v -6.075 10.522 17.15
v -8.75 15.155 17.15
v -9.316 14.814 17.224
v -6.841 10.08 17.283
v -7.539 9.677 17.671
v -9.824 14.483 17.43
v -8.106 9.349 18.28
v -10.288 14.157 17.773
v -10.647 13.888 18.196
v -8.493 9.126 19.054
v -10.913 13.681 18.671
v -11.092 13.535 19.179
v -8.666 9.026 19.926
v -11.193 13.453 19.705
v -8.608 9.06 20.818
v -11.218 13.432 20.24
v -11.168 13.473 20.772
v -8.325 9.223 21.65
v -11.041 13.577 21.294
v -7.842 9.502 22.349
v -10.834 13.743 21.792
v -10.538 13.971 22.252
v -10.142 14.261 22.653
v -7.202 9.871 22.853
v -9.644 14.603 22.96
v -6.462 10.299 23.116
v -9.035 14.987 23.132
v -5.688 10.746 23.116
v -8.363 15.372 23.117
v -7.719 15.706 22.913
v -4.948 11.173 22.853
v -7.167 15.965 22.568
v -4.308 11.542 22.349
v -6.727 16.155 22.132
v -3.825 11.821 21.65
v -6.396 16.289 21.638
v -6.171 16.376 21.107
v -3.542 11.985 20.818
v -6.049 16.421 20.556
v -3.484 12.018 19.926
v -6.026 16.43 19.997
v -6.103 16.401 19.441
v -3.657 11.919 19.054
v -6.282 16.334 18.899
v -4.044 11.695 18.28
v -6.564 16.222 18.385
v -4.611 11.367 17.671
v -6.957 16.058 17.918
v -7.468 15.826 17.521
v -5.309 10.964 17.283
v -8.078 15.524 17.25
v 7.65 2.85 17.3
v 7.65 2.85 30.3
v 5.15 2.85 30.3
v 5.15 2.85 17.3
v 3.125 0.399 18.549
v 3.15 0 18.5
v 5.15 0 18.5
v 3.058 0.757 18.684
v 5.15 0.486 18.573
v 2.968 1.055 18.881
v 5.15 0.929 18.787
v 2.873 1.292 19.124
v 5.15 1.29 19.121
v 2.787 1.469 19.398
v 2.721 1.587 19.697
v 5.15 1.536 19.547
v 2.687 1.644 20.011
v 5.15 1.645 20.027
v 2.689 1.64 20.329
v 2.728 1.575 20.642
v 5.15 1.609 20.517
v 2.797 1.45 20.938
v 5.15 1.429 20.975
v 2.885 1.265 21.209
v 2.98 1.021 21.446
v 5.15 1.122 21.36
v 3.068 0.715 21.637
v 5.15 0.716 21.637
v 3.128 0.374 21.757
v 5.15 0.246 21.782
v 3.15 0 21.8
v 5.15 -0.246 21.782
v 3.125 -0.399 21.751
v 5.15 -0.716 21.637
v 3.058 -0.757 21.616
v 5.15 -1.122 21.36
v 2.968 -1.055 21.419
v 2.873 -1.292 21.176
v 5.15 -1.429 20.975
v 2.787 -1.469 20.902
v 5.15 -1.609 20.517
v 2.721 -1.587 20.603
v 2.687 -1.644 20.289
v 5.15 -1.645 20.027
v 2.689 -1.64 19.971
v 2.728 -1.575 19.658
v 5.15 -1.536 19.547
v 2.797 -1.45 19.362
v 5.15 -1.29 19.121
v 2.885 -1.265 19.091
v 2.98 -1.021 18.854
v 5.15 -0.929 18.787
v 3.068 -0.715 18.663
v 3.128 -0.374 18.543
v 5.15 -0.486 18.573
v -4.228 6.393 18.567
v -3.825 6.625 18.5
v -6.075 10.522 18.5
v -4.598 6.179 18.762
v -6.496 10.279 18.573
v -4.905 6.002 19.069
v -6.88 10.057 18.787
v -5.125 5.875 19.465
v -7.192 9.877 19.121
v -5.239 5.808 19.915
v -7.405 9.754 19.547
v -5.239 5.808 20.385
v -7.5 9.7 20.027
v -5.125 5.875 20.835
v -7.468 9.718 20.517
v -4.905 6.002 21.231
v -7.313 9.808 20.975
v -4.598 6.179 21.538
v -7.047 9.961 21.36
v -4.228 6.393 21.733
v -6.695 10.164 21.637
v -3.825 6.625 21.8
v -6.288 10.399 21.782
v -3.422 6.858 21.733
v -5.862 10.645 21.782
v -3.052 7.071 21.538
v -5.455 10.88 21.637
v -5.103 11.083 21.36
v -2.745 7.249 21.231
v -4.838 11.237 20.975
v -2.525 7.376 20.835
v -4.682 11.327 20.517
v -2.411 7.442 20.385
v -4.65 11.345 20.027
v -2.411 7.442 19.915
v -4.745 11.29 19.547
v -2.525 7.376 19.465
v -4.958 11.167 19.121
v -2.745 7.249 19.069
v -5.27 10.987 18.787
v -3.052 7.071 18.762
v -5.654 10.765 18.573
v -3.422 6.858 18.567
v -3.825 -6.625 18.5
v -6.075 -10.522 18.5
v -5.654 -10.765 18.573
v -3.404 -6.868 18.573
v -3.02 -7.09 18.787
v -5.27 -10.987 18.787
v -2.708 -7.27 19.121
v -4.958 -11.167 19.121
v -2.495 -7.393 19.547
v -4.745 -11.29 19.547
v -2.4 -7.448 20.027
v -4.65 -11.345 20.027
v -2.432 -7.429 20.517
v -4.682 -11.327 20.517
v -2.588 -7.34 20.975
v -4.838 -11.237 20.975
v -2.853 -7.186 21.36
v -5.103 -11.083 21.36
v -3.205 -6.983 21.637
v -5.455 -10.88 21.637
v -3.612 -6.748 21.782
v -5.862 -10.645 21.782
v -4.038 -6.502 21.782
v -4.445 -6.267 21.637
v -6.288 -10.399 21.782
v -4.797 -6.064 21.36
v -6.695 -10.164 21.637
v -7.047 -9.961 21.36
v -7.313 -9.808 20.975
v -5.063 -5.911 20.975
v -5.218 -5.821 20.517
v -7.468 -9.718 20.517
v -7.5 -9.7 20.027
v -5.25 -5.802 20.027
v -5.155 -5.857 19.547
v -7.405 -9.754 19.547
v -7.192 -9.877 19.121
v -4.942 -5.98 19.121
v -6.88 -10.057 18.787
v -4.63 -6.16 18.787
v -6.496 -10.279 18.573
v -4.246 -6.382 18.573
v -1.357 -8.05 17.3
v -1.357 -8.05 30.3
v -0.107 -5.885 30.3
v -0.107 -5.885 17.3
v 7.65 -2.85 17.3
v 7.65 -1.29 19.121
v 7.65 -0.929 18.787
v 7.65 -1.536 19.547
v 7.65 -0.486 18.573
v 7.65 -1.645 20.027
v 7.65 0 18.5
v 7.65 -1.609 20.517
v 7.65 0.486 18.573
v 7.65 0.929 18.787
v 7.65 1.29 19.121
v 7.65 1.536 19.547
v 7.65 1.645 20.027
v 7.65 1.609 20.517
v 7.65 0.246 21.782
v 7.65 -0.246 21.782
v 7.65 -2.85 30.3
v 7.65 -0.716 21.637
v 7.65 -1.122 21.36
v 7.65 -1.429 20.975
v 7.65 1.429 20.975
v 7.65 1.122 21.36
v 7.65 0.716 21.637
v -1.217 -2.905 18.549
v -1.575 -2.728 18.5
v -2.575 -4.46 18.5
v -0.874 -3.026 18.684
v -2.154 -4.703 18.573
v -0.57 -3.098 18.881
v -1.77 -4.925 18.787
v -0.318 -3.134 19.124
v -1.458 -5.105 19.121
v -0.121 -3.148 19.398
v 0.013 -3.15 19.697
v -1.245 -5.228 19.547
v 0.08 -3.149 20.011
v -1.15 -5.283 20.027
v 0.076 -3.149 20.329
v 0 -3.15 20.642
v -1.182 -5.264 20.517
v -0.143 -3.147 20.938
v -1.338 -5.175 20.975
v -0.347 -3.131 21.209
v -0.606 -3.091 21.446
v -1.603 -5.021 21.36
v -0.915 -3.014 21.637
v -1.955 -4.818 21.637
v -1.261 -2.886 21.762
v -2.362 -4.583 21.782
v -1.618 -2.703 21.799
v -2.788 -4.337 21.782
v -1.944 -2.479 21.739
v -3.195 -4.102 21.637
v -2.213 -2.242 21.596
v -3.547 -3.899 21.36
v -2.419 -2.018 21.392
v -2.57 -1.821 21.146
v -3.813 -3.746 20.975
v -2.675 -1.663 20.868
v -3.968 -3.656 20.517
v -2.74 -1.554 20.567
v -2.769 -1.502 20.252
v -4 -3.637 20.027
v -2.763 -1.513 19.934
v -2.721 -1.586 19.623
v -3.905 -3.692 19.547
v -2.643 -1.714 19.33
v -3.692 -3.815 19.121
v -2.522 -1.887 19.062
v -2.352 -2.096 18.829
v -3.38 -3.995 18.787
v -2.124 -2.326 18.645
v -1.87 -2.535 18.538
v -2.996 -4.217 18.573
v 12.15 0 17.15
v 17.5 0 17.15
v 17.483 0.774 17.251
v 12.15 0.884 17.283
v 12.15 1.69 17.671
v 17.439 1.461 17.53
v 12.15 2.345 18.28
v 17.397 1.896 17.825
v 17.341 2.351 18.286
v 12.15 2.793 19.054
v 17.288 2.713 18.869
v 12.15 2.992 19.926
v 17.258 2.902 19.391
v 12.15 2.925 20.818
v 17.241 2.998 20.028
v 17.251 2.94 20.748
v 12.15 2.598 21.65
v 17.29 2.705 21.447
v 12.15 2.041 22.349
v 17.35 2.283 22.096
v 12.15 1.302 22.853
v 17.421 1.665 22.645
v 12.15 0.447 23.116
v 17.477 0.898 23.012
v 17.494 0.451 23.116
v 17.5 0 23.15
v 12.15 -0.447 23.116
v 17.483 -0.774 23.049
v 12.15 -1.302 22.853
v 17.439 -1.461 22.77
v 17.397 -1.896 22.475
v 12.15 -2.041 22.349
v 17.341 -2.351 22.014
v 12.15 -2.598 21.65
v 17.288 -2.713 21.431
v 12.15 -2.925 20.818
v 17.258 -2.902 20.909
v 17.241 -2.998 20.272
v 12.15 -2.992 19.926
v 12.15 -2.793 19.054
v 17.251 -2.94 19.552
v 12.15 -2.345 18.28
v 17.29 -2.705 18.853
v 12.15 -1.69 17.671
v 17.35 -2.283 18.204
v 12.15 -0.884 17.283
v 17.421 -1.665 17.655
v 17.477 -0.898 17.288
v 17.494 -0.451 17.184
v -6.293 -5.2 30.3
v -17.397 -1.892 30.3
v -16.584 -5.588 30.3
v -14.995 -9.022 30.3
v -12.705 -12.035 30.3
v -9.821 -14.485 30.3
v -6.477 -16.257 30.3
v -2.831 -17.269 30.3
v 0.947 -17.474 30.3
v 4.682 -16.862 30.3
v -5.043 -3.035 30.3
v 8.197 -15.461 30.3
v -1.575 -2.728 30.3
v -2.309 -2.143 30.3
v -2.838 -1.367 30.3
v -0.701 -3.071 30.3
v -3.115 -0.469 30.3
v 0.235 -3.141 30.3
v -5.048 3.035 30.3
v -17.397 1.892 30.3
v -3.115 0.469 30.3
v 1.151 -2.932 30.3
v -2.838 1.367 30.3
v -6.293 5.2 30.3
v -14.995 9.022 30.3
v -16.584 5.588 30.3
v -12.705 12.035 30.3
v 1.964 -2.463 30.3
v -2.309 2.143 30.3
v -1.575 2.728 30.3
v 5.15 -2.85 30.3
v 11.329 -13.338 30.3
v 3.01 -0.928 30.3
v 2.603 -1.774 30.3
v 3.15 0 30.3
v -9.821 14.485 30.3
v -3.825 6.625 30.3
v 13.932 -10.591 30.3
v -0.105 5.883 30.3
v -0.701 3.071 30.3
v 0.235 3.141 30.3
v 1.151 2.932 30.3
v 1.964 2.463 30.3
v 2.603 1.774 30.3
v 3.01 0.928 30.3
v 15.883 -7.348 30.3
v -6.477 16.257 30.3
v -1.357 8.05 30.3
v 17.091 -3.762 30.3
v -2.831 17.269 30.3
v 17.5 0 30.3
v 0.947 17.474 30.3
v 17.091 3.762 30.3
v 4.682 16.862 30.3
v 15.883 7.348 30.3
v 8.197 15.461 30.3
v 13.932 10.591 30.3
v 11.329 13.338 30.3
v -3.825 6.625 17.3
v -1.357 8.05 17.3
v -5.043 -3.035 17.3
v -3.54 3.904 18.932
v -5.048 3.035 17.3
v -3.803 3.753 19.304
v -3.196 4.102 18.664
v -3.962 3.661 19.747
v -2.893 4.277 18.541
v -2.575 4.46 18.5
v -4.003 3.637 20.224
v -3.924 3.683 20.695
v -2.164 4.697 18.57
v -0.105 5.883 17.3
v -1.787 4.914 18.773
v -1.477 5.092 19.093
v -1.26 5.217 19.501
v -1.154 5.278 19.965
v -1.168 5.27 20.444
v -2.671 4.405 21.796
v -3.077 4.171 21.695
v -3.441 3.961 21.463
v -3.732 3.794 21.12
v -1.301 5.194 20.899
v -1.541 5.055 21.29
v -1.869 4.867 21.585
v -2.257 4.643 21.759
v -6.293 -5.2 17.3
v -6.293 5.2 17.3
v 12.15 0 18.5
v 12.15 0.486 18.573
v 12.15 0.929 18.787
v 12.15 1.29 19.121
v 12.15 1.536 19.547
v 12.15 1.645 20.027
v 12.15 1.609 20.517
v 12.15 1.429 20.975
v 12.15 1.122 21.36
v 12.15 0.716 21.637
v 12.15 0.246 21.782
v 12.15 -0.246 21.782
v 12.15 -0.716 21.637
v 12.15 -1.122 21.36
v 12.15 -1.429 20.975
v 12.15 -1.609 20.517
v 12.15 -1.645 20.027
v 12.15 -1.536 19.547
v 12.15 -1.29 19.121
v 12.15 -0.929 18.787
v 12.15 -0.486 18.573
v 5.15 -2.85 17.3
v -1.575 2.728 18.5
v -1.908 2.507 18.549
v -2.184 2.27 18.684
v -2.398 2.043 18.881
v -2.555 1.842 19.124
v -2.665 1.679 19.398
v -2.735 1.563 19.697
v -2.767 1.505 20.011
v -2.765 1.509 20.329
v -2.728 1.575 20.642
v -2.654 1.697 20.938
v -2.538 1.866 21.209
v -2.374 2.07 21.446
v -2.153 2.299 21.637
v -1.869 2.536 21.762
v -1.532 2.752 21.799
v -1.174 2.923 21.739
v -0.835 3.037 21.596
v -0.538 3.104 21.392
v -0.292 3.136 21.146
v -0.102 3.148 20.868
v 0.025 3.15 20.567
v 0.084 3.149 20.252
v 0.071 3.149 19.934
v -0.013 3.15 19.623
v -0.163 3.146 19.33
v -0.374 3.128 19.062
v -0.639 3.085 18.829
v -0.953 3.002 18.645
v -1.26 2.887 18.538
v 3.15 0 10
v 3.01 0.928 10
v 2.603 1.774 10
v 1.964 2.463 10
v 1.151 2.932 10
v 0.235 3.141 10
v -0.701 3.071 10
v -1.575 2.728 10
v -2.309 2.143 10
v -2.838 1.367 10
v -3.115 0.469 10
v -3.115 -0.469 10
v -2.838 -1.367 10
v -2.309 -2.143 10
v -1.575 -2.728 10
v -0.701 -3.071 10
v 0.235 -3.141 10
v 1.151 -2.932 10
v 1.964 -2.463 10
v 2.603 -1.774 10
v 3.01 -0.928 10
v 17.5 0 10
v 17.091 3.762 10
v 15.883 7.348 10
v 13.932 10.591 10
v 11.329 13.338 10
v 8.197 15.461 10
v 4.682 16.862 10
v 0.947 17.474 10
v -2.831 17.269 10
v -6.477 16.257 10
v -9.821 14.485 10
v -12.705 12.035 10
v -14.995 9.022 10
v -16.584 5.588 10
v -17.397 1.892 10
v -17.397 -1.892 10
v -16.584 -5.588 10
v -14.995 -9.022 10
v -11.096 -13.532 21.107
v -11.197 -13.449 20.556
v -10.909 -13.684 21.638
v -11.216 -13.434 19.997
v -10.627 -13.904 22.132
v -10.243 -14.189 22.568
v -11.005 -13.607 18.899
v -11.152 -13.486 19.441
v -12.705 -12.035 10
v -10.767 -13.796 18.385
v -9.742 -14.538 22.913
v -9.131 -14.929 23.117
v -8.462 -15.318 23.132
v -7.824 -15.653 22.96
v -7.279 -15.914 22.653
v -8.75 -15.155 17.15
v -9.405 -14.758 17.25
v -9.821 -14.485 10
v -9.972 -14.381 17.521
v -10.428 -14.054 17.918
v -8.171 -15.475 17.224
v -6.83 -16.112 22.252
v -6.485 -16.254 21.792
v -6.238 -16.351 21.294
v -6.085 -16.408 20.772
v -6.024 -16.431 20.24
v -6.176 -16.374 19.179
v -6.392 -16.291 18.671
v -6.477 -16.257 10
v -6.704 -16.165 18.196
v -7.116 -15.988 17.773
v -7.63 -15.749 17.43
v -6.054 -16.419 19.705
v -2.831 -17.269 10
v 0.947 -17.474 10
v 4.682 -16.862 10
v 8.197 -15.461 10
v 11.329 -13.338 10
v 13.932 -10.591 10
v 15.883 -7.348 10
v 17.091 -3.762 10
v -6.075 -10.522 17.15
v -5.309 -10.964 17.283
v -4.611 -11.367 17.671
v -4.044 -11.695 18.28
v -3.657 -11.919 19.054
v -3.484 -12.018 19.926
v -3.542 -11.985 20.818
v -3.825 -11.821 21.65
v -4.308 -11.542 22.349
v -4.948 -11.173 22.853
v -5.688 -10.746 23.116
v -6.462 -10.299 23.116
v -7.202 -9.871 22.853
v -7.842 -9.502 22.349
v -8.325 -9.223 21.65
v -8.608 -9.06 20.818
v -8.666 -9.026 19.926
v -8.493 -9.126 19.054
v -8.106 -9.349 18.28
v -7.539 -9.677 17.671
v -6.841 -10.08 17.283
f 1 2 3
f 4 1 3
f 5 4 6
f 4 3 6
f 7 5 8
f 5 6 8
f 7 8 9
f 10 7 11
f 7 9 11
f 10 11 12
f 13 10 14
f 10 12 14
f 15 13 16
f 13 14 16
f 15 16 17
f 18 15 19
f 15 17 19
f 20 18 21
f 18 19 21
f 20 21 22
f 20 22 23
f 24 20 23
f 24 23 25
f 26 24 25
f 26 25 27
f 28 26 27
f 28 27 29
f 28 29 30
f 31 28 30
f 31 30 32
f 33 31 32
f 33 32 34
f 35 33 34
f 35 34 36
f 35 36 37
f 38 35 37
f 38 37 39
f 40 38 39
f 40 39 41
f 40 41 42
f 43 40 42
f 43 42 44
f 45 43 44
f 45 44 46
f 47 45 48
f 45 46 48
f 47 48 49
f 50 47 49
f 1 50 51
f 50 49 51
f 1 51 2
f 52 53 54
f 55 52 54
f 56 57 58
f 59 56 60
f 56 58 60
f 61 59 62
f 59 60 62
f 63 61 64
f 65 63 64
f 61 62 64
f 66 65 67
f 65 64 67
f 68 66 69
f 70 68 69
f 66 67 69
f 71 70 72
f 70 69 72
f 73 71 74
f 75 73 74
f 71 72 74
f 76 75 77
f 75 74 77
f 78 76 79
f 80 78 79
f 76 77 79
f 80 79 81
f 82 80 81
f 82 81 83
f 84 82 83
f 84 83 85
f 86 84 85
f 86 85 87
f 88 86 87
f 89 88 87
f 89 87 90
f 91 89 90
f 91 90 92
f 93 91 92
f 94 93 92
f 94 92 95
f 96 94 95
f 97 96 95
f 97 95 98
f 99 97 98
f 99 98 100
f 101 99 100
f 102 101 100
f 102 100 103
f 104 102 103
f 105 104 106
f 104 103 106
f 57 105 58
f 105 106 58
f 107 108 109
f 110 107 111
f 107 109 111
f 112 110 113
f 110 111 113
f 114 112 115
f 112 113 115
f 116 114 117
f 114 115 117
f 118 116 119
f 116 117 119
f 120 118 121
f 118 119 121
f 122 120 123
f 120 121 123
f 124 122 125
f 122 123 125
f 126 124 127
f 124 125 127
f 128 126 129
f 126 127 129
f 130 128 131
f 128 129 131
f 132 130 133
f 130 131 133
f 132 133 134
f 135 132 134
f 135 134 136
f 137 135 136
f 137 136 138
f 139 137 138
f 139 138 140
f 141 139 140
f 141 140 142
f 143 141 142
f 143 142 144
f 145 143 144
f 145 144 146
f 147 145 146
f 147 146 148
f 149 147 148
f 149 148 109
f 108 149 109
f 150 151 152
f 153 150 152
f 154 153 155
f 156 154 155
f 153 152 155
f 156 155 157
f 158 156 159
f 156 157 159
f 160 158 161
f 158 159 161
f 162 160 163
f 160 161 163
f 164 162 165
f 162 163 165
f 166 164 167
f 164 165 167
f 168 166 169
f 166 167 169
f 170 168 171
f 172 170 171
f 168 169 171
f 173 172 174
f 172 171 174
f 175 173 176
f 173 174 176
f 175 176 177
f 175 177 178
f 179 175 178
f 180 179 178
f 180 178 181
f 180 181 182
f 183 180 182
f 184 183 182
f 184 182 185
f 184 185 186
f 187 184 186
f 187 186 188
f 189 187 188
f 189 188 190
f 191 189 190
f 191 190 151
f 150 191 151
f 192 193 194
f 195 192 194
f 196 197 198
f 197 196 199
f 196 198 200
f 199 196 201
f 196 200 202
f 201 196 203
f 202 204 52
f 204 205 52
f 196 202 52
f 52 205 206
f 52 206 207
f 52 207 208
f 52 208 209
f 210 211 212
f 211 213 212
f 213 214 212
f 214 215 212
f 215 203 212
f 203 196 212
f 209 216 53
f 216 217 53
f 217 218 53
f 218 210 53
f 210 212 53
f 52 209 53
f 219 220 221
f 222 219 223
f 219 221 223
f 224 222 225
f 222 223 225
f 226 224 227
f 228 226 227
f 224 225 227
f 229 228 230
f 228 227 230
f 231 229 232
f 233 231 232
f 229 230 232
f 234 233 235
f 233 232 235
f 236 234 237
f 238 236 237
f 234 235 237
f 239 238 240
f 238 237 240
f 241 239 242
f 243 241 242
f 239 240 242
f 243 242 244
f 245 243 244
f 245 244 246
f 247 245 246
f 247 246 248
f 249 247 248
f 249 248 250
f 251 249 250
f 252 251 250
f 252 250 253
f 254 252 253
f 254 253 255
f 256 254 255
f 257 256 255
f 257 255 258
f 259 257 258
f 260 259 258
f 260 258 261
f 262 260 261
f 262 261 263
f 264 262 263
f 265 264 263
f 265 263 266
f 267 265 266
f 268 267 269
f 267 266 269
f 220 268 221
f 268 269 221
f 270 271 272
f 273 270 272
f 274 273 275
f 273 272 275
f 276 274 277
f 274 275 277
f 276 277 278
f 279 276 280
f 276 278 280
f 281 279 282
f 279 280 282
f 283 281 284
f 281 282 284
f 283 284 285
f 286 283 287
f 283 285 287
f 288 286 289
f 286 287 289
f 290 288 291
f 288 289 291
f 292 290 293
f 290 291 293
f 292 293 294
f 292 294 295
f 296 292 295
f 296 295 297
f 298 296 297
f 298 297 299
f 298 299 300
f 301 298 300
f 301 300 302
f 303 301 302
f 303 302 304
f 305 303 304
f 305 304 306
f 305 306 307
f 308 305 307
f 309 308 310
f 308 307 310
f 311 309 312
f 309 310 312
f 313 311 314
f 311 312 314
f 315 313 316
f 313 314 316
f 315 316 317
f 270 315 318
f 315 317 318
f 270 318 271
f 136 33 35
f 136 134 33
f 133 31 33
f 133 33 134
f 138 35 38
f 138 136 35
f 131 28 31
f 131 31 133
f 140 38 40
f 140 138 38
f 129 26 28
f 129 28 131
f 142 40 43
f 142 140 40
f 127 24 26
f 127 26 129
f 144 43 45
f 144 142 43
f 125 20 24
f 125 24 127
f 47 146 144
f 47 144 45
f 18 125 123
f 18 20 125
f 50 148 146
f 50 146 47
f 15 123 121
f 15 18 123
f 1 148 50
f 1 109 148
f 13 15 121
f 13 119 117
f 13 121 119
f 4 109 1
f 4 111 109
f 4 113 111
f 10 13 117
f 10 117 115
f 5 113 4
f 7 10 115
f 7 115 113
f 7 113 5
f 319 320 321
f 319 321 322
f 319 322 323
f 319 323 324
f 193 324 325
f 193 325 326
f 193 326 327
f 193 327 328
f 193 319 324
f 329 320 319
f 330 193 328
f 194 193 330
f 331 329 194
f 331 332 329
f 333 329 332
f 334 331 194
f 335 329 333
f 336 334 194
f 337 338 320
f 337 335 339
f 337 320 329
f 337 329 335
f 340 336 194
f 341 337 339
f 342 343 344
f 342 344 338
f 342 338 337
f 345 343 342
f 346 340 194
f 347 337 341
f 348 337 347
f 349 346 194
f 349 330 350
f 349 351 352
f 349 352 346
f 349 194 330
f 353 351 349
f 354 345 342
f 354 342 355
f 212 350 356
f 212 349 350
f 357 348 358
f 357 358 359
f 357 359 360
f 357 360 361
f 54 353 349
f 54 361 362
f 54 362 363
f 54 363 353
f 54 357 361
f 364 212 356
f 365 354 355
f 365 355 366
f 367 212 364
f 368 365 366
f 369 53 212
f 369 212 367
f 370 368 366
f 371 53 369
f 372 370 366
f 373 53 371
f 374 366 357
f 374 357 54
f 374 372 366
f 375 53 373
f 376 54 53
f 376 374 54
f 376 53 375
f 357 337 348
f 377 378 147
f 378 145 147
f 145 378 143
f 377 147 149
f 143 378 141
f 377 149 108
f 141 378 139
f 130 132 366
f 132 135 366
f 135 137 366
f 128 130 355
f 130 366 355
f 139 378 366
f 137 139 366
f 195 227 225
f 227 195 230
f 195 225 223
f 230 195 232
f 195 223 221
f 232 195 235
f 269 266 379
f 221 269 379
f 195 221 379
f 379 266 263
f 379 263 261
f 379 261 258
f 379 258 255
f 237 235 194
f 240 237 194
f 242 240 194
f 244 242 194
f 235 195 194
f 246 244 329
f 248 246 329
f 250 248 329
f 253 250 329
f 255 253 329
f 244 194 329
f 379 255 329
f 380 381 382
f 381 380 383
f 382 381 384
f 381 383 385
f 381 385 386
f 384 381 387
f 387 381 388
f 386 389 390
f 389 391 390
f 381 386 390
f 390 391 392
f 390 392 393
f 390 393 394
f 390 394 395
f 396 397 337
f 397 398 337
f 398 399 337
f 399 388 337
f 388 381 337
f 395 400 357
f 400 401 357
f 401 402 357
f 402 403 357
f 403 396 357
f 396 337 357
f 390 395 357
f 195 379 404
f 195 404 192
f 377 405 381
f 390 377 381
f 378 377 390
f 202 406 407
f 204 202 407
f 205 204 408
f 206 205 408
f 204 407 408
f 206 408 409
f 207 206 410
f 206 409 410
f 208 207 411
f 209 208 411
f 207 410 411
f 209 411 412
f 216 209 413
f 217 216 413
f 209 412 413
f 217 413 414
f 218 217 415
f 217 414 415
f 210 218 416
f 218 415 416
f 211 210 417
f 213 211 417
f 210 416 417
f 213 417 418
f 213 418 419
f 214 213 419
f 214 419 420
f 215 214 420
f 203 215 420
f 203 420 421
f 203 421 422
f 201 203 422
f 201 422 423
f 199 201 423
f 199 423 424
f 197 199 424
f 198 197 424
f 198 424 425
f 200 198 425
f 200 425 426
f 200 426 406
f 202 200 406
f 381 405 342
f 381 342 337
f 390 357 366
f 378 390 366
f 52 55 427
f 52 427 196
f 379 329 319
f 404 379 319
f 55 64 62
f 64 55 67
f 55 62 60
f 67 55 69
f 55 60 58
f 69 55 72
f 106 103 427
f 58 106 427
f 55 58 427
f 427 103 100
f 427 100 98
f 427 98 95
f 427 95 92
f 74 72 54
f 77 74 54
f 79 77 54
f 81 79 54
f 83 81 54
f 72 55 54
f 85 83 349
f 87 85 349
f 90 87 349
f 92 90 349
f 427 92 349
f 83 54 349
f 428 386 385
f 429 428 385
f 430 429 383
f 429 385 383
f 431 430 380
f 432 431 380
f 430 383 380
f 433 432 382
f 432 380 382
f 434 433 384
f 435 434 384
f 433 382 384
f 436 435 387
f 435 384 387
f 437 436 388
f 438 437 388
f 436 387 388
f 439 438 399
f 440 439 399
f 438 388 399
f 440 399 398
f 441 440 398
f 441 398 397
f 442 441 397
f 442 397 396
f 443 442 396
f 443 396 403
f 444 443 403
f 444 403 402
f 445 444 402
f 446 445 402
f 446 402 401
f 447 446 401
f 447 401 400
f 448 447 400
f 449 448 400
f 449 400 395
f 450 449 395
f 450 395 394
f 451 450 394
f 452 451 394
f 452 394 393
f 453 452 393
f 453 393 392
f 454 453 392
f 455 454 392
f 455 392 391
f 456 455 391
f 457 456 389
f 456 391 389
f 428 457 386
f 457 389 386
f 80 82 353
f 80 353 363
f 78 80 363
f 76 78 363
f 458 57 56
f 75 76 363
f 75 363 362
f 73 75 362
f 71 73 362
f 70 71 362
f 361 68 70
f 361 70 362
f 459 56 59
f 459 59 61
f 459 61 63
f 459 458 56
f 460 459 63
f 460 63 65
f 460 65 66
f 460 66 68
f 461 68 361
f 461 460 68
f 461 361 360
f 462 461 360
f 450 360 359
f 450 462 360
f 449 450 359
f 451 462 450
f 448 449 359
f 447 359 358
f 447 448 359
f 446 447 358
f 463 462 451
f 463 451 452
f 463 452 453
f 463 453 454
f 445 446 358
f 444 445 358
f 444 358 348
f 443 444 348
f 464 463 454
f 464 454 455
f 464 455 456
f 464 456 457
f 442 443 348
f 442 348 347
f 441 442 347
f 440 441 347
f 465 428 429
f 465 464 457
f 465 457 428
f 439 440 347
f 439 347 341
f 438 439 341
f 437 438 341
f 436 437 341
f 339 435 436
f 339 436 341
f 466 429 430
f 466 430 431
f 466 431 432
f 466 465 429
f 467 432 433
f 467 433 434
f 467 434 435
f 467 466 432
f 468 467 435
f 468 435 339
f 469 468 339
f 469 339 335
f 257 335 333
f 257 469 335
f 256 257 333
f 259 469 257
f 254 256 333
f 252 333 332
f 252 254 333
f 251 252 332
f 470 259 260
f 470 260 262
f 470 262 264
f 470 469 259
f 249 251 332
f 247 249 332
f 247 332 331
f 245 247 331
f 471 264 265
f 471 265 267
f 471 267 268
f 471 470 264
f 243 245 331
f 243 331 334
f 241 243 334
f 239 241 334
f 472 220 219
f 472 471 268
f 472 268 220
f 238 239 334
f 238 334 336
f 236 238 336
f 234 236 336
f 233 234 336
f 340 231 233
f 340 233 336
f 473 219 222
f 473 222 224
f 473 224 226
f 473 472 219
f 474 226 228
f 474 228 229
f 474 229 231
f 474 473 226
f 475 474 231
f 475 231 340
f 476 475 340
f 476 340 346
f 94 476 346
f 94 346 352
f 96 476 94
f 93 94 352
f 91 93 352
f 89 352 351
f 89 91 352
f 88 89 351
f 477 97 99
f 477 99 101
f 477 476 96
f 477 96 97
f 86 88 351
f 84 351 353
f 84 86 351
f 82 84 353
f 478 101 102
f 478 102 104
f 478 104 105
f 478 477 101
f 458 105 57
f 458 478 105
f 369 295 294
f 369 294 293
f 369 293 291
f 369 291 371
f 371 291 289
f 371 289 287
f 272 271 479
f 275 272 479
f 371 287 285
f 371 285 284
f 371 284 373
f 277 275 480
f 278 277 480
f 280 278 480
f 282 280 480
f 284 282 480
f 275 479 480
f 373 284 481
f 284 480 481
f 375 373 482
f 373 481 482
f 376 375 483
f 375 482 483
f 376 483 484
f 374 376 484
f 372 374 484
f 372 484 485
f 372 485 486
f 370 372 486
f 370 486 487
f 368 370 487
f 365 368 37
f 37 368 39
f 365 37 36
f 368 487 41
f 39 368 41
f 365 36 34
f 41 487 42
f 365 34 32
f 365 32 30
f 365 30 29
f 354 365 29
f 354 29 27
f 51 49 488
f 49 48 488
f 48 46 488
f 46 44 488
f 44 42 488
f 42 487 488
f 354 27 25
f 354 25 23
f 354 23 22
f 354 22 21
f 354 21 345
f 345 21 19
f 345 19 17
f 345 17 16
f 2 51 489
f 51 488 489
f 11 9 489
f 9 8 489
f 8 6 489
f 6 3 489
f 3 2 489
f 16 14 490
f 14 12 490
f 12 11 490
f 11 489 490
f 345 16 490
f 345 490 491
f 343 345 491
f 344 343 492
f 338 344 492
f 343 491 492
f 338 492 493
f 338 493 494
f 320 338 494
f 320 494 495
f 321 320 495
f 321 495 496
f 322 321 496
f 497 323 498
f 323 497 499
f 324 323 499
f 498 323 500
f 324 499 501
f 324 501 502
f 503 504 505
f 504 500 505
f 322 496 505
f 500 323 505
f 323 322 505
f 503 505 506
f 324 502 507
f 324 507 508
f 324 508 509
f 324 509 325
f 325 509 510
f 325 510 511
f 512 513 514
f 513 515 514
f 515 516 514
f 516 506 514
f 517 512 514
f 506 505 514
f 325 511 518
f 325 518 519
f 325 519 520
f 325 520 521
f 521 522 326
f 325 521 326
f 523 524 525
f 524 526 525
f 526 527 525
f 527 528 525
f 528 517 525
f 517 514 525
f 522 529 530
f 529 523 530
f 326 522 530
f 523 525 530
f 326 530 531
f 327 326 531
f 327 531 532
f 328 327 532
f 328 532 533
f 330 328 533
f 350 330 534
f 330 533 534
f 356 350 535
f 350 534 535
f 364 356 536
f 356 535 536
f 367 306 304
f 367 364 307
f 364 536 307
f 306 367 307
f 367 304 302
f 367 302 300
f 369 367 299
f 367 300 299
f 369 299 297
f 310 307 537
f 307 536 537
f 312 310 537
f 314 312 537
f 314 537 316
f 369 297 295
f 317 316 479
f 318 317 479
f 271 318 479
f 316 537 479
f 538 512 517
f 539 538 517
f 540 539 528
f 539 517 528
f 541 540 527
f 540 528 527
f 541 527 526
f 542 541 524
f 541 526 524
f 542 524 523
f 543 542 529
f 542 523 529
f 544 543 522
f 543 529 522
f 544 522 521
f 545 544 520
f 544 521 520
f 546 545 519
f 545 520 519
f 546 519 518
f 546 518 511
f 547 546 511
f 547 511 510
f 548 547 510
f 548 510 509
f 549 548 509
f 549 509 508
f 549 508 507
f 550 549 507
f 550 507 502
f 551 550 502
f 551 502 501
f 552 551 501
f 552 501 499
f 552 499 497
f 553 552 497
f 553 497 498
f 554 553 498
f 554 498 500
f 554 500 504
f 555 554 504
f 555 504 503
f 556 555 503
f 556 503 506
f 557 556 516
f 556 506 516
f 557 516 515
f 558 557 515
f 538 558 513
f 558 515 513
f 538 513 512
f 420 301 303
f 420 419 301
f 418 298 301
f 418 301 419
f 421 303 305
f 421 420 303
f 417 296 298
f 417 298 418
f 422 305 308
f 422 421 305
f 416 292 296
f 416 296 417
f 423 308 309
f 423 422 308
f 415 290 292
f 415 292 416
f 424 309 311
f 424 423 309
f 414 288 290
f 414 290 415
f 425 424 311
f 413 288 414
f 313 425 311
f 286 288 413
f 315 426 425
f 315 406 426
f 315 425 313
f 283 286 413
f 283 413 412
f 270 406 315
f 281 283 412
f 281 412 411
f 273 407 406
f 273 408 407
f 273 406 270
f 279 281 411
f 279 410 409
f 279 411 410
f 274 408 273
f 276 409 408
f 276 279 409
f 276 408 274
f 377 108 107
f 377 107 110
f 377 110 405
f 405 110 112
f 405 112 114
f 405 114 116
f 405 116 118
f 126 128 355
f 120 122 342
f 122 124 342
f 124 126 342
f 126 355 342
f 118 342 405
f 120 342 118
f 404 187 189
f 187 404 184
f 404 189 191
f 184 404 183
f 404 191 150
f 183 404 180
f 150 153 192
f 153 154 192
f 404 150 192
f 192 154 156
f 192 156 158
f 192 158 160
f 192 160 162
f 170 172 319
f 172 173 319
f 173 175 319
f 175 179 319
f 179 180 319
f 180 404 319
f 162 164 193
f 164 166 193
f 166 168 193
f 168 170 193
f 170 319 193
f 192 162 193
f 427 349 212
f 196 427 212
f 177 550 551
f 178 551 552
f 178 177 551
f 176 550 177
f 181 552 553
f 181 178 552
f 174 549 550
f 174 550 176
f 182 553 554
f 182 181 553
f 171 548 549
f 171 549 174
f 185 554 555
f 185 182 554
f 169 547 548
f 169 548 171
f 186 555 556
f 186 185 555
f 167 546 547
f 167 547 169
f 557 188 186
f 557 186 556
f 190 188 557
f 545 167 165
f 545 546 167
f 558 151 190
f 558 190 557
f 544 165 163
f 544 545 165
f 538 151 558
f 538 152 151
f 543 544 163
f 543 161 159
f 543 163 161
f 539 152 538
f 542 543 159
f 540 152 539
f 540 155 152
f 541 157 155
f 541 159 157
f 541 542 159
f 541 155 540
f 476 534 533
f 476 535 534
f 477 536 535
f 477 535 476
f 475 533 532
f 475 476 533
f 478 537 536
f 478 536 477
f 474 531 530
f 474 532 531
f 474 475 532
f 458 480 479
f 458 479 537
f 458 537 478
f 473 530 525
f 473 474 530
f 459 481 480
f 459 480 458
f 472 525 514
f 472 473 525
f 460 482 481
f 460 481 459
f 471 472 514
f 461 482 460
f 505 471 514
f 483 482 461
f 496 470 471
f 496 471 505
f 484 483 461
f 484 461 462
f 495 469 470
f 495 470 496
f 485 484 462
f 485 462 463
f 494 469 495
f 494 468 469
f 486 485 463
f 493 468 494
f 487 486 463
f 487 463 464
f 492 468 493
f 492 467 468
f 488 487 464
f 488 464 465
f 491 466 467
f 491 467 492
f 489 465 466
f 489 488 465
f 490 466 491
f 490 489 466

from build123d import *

# Parameters (mm, degrees)
SKETCH1_R           = 17.5
SKETCH1_R_2         = 3.15
BOSS_EXTRUDE1_DEPTH = 40.3
CUT_EXTRUDE1_DEPTH  = 23
CUT_EXTRUDE4_REACH  = 43.405
SKETCH8_R           = 1.65
CUT_EXTRUDE5_REACH  = 43.405
SKETCH10_R          = 1.65
SKETCH12_R          = 3
CUT_EXTRUDE6_DEPTH  = 5.35
SKETCH15_R          = 3
CUT_EXTRUDE8_DEPTH  = 5.35
CUT_EXTRUDE9_REACH  = 43.405
SKETCH17_R          = 1.65
CUT_EXTRUDE10_REACH = 43.405
SKETCH18_R          = 1.65
SKETCH19_R          = 3
CUT_EXTRUDE11_DEPTH = 5.35
CUT_EXTRUDE12_REACH = 37
SKETCH20_R          = 1.65
CUT_EXTRUDE13_REACH = 37
SKETCH21_R          = 1.65
SKETCH22_R          = 17.5
CUT_EXTRUDE14_DEPTH = 10
SKETCH23_R          = 17.5
CUT_EXTRUDE15_DEPTH = 10


with BuildPart() as part:
    # Sketch1 → Boss-Extrude1 (new body)
    with BuildSketch(Plane.XY):
        Circle(SKETCH1_R)
        Circle(SKETCH1_R_2, mode=Mode.SUBTRACT)
    extrude(amount=BOSS_EXTRUDE1_DEPTH)

    # Sketch2 → Cut-Extrude1 (cut)
    with BuildSketch(Plane.XY.offset(40.3)):
        Polygon((7.65, 0), (7.65, 2.85), (5.15, 2.85), (5.15, -2.85), (7.65, -2.85), align=None)
        Polygon((-3.825, -6.625094339), (-1.356827599, -8.050094339), (-0.106827599, -5.885030829), (-5.043172401, -3.035030829), (-6.293172401, -5.200094339), align=None)
        Polygon((-3.825, 6.625094339), (-6.293172401, 5.200094339), (-5.048242412, 3.035349353), (-0.105426694, 5.882604512), (-1.356827546, 8.050094369), align=None)
    extrude(amount=-CUT_EXTRUDE1_DEPTH, mode=Mode.SUBTRACT)

    # Sketch8 → Cut-Extrude4 (cut, up to next)
    with BuildSketch(Plane(origin=(-8.75, -15.155444566, 0), x_dir=(0, 0, -1), z_dir=(-0.5, -0.866025404, 0)), mode=Mode.PRIVATE) as cut_extrude4_sk1:
        with Locations((-20.15, 0)):
            Circle(SKETCH8_R)
    cut_extrude4_tool1 = extrude(cut_extrude4_sk1.sketch, amount=-CUT_EXTRUDE4_REACH, mode=Mode.PRIVATE) & part.part
    add(cut_extrude4_tool1.solids().sort_by_distance((-8.75, -15.155445, 20.15))[0], mode=Mode.SUBTRACT)

    # Sketch10 → Cut-Extrude5 (cut, up to next)
    with BuildSketch(Plane(origin=(-8.75, -15.155444566, 0), x_dir=(0, 0, -1), z_dir=(-0.5, -0.866025404, 0)), mode=Mode.PRIVATE) as cut_extrude5_sk1:
        with Locations((-20.15, 0)):
            Circle(SKETCH10_R)
    cut_extrude5_tool1 = extrude(cut_extrude5_sk1.sketch, amount=-CUT_EXTRUDE5_REACH, mode=Mode.PRIVATE) & part.part
    add(cut_extrude5_tool1.solids().sort_by_distance((-8.75, -15.155445, 20.15))[0], mode=Mode.SUBTRACT)

    # Sketch12 → Cut-Extrude6 (cut)
    with BuildSketch(Plane(origin=(-8.75, -15.155444566, 0), x_dir=(0, 0, -1), z_dir=(-0.5, -0.866025404, 0))):
        with Locations((-20.15, 0)):
            Circle(SKETCH12_R)
    extrude(amount=-CUT_EXTRUDE6_DEPTH, mode=Mode.SUBTRACT)

    # Sketch15 → Cut-Extrude8 (cut)
    with BuildSketch(Plane(origin=(-8.75, 15.155444566, 0), x_dir=(0, 0, -1), z_dir=(-0.5, 0.866025404, 0))):
        with Locations((-20.15, 0)):
            Circle(SKETCH15_R)
    extrude(amount=-CUT_EXTRUDE8_DEPTH, mode=Mode.SUBTRACT)

    # Sketch17 → Cut-Extrude9 (cut, up to next)
    with BuildSketch(Plane(origin=(-8.75, 15.155444566, 0), x_dir=(0, 0, -1), z_dir=(-0.5, 0.866025404, 0)), mode=Mode.PRIVATE) as cut_extrude9_sk1:
        with Locations((-20.15, 0)):
            Circle(SKETCH17_R)
    cut_extrude9_tool1 = extrude(cut_extrude9_sk1.sketch, amount=-CUT_EXTRUDE9_REACH, mode=Mode.PRIVATE) & part.part
    add(cut_extrude9_tool1.solids().sort_by_distance((-8.75, 15.155445, 20.15))[0], mode=Mode.SUBTRACT)

    # Sketch18 → Cut-Extrude10 (cut, up to next)
    with BuildSketch(Plane(origin=(-8.75, 15.155444566, 0), x_dir=(0, 0, -1), z_dir=(-0.5, 0.866025404, 0)), mode=Mode.PRIVATE) as cut_extrude10_sk1:
        with Locations((-20.15, 0)):
            Circle(SKETCH18_R)
    cut_extrude10_tool1 = extrude(cut_extrude10_sk1.sketch, amount=-CUT_EXTRUDE10_REACH, mode=Mode.PRIVATE) & part.part
    add(cut_extrude10_tool1.solids().sort_by_distance((-8.75, 15.155445, 20.15))[0], mode=Mode.SUBTRACT)

    # Sketch19 → Cut-Extrude11 (cut)
    with BuildSketch(Plane(origin=(17.5, 0, 0), x_dir=(0, 0, -1), z_dir=(1, 0, 0))):
        with Locations((-20.15, 0)):
            Circle(SKETCH19_R)
    extrude(amount=-CUT_EXTRUDE11_DEPTH, mode=Mode.SUBTRACT)

    # Sketch20 → Cut-Extrude12 (cut, up to next)
    with BuildSketch(Plane(origin=(17.5, 0, 0), x_dir=(0, 0, -1), z_dir=(1, 0, 0)), mode=Mode.PRIVATE) as cut_extrude12_sk1:
        with Locations((-20.15, 0)):
            Circle(SKETCH20_R)
    cut_extrude12_tool1 = extrude(cut_extrude12_sk1.sketch, amount=-CUT_EXTRUDE12_REACH, mode=Mode.PRIVATE) & part.part
    add(cut_extrude12_tool1.solids().sort_by_distance((17.5, 0, 20.15))[0], mode=Mode.SUBTRACT)

    # Sketch21 → Cut-Extrude13 (cut, up to next)
    with BuildSketch(Plane(origin=(17.5, 0, 0), x_dir=(0, 0, -1), z_dir=(1, 0, 0)), mode=Mode.PRIVATE) as cut_extrude13_sk1:
        with Locations((-20.15, 0)):
            Circle(SKETCH21_R)
    cut_extrude13_tool1 = extrude(cut_extrude13_sk1.sketch, amount=-CUT_EXTRUDE13_REACH, mode=Mode.PRIVATE) & part.part
    add(cut_extrude13_tool1.solids().sort_by_distance((17.5, 0, 20.15))[0], mode=Mode.SUBTRACT)

    # Sketch22 → Cut-Extrude14 (cut)
    with BuildSketch(Plane(origin=(0, 0, 0), x_dir=(-1, 0, 0), z_dir=(0, 0, -1))):
        Circle(SKETCH22_R)
    extrude(amount=-CUT_EXTRUDE14_DEPTH, mode=Mode.SUBTRACT)

    # Sketch23 → Cut-Extrude15 (cut)
    with BuildSketch(Plane.XY.offset(40.3)):
        Circle(SKETCH23_R)
    extrude(amount=-CUT_EXTRUDE15_DEPTH, mode=Mode.SUBTRACT)


solid = part.part
